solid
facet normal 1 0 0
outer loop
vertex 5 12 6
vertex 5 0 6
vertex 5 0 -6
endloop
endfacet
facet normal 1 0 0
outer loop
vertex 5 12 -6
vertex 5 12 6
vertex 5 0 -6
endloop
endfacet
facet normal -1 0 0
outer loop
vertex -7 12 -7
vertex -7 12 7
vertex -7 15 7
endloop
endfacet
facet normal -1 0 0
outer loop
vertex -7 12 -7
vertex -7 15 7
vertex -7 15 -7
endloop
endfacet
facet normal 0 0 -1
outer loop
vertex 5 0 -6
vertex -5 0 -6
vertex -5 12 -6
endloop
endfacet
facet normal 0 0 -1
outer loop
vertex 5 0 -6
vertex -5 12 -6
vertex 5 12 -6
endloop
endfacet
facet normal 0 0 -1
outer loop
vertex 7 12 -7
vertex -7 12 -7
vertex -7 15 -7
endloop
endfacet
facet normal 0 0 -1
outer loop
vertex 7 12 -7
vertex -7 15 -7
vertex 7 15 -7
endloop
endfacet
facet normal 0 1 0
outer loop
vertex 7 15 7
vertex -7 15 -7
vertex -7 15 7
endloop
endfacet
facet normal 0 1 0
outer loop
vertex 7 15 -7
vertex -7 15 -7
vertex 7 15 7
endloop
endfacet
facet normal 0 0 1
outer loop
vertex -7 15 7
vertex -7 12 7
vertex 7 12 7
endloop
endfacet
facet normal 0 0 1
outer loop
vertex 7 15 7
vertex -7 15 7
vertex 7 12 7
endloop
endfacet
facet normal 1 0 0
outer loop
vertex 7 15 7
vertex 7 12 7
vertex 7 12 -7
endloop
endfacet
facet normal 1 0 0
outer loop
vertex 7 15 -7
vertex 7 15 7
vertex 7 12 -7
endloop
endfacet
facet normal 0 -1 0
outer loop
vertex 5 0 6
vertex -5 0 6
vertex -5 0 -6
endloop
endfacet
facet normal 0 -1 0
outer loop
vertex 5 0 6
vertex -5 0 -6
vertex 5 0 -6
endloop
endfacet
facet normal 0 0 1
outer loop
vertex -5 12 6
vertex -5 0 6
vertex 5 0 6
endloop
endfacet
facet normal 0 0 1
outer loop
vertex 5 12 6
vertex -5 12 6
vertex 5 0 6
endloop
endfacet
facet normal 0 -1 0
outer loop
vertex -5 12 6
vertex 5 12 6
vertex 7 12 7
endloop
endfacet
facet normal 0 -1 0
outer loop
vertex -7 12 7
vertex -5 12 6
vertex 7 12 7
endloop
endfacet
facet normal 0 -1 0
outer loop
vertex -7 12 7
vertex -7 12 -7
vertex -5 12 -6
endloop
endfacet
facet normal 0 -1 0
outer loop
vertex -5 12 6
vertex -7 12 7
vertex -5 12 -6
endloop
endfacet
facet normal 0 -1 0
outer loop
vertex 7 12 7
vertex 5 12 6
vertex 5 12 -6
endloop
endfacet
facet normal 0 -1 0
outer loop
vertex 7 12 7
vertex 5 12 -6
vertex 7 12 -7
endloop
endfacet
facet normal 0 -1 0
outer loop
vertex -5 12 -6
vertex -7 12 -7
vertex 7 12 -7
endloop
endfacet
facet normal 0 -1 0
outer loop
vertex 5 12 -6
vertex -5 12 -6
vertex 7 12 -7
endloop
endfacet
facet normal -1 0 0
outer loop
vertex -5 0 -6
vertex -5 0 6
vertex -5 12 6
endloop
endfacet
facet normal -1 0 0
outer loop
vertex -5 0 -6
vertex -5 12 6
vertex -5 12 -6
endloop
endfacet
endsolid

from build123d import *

# Parameters (mm, degrees)
SKETCH_1_W      = 10
SKETCH_1_H      = 12
EXTRUDE_1_DEPTH = 12
EXTRUDE_START   = 12
SKETCH_1_3_W    = 14
SKETCH_1_3_H    = 14
SKETCH_1_3_W_2  = 10
SKETCH_1_3_H_2  = 12
EXTRUDE_2_DEPTH = 3


with BuildPart() as part:
    # Эскиз1 → Бобышка-Вытянуть1 (new body)
    with BuildSketch(Plane(origin=(0, 0, 0), x_dir=(1, 0, 0), z_dir=(0, 1, 0))):
        Rectangle(SKETCH_1_W, SKETCH_1_H)
    extrude(amount=EXTRUDE_1_DEPTH)

    # Эскиз1<3> → Бобышка-Вытянуть2 (add)
    with BuildSketch(Plane(origin=(0, 0, 0), x_dir=(1, 0, 0), z_dir=(0, 1, 0)).offset(EXTRUDE_START)):
        Rectangle(SKETCH_1_3_W, SKETCH_1_3_H)
        Rectangle(SKETCH_1_3_W_2, SKETCH_1_3_H_2, mode=Mode.SUBTRACT)
        Rectangle(SKETCH_1_3_W_2, SKETCH_1_3_H_2)
    extrude(amount=EXTRUDE_2_DEPTH)


solid = part.part
